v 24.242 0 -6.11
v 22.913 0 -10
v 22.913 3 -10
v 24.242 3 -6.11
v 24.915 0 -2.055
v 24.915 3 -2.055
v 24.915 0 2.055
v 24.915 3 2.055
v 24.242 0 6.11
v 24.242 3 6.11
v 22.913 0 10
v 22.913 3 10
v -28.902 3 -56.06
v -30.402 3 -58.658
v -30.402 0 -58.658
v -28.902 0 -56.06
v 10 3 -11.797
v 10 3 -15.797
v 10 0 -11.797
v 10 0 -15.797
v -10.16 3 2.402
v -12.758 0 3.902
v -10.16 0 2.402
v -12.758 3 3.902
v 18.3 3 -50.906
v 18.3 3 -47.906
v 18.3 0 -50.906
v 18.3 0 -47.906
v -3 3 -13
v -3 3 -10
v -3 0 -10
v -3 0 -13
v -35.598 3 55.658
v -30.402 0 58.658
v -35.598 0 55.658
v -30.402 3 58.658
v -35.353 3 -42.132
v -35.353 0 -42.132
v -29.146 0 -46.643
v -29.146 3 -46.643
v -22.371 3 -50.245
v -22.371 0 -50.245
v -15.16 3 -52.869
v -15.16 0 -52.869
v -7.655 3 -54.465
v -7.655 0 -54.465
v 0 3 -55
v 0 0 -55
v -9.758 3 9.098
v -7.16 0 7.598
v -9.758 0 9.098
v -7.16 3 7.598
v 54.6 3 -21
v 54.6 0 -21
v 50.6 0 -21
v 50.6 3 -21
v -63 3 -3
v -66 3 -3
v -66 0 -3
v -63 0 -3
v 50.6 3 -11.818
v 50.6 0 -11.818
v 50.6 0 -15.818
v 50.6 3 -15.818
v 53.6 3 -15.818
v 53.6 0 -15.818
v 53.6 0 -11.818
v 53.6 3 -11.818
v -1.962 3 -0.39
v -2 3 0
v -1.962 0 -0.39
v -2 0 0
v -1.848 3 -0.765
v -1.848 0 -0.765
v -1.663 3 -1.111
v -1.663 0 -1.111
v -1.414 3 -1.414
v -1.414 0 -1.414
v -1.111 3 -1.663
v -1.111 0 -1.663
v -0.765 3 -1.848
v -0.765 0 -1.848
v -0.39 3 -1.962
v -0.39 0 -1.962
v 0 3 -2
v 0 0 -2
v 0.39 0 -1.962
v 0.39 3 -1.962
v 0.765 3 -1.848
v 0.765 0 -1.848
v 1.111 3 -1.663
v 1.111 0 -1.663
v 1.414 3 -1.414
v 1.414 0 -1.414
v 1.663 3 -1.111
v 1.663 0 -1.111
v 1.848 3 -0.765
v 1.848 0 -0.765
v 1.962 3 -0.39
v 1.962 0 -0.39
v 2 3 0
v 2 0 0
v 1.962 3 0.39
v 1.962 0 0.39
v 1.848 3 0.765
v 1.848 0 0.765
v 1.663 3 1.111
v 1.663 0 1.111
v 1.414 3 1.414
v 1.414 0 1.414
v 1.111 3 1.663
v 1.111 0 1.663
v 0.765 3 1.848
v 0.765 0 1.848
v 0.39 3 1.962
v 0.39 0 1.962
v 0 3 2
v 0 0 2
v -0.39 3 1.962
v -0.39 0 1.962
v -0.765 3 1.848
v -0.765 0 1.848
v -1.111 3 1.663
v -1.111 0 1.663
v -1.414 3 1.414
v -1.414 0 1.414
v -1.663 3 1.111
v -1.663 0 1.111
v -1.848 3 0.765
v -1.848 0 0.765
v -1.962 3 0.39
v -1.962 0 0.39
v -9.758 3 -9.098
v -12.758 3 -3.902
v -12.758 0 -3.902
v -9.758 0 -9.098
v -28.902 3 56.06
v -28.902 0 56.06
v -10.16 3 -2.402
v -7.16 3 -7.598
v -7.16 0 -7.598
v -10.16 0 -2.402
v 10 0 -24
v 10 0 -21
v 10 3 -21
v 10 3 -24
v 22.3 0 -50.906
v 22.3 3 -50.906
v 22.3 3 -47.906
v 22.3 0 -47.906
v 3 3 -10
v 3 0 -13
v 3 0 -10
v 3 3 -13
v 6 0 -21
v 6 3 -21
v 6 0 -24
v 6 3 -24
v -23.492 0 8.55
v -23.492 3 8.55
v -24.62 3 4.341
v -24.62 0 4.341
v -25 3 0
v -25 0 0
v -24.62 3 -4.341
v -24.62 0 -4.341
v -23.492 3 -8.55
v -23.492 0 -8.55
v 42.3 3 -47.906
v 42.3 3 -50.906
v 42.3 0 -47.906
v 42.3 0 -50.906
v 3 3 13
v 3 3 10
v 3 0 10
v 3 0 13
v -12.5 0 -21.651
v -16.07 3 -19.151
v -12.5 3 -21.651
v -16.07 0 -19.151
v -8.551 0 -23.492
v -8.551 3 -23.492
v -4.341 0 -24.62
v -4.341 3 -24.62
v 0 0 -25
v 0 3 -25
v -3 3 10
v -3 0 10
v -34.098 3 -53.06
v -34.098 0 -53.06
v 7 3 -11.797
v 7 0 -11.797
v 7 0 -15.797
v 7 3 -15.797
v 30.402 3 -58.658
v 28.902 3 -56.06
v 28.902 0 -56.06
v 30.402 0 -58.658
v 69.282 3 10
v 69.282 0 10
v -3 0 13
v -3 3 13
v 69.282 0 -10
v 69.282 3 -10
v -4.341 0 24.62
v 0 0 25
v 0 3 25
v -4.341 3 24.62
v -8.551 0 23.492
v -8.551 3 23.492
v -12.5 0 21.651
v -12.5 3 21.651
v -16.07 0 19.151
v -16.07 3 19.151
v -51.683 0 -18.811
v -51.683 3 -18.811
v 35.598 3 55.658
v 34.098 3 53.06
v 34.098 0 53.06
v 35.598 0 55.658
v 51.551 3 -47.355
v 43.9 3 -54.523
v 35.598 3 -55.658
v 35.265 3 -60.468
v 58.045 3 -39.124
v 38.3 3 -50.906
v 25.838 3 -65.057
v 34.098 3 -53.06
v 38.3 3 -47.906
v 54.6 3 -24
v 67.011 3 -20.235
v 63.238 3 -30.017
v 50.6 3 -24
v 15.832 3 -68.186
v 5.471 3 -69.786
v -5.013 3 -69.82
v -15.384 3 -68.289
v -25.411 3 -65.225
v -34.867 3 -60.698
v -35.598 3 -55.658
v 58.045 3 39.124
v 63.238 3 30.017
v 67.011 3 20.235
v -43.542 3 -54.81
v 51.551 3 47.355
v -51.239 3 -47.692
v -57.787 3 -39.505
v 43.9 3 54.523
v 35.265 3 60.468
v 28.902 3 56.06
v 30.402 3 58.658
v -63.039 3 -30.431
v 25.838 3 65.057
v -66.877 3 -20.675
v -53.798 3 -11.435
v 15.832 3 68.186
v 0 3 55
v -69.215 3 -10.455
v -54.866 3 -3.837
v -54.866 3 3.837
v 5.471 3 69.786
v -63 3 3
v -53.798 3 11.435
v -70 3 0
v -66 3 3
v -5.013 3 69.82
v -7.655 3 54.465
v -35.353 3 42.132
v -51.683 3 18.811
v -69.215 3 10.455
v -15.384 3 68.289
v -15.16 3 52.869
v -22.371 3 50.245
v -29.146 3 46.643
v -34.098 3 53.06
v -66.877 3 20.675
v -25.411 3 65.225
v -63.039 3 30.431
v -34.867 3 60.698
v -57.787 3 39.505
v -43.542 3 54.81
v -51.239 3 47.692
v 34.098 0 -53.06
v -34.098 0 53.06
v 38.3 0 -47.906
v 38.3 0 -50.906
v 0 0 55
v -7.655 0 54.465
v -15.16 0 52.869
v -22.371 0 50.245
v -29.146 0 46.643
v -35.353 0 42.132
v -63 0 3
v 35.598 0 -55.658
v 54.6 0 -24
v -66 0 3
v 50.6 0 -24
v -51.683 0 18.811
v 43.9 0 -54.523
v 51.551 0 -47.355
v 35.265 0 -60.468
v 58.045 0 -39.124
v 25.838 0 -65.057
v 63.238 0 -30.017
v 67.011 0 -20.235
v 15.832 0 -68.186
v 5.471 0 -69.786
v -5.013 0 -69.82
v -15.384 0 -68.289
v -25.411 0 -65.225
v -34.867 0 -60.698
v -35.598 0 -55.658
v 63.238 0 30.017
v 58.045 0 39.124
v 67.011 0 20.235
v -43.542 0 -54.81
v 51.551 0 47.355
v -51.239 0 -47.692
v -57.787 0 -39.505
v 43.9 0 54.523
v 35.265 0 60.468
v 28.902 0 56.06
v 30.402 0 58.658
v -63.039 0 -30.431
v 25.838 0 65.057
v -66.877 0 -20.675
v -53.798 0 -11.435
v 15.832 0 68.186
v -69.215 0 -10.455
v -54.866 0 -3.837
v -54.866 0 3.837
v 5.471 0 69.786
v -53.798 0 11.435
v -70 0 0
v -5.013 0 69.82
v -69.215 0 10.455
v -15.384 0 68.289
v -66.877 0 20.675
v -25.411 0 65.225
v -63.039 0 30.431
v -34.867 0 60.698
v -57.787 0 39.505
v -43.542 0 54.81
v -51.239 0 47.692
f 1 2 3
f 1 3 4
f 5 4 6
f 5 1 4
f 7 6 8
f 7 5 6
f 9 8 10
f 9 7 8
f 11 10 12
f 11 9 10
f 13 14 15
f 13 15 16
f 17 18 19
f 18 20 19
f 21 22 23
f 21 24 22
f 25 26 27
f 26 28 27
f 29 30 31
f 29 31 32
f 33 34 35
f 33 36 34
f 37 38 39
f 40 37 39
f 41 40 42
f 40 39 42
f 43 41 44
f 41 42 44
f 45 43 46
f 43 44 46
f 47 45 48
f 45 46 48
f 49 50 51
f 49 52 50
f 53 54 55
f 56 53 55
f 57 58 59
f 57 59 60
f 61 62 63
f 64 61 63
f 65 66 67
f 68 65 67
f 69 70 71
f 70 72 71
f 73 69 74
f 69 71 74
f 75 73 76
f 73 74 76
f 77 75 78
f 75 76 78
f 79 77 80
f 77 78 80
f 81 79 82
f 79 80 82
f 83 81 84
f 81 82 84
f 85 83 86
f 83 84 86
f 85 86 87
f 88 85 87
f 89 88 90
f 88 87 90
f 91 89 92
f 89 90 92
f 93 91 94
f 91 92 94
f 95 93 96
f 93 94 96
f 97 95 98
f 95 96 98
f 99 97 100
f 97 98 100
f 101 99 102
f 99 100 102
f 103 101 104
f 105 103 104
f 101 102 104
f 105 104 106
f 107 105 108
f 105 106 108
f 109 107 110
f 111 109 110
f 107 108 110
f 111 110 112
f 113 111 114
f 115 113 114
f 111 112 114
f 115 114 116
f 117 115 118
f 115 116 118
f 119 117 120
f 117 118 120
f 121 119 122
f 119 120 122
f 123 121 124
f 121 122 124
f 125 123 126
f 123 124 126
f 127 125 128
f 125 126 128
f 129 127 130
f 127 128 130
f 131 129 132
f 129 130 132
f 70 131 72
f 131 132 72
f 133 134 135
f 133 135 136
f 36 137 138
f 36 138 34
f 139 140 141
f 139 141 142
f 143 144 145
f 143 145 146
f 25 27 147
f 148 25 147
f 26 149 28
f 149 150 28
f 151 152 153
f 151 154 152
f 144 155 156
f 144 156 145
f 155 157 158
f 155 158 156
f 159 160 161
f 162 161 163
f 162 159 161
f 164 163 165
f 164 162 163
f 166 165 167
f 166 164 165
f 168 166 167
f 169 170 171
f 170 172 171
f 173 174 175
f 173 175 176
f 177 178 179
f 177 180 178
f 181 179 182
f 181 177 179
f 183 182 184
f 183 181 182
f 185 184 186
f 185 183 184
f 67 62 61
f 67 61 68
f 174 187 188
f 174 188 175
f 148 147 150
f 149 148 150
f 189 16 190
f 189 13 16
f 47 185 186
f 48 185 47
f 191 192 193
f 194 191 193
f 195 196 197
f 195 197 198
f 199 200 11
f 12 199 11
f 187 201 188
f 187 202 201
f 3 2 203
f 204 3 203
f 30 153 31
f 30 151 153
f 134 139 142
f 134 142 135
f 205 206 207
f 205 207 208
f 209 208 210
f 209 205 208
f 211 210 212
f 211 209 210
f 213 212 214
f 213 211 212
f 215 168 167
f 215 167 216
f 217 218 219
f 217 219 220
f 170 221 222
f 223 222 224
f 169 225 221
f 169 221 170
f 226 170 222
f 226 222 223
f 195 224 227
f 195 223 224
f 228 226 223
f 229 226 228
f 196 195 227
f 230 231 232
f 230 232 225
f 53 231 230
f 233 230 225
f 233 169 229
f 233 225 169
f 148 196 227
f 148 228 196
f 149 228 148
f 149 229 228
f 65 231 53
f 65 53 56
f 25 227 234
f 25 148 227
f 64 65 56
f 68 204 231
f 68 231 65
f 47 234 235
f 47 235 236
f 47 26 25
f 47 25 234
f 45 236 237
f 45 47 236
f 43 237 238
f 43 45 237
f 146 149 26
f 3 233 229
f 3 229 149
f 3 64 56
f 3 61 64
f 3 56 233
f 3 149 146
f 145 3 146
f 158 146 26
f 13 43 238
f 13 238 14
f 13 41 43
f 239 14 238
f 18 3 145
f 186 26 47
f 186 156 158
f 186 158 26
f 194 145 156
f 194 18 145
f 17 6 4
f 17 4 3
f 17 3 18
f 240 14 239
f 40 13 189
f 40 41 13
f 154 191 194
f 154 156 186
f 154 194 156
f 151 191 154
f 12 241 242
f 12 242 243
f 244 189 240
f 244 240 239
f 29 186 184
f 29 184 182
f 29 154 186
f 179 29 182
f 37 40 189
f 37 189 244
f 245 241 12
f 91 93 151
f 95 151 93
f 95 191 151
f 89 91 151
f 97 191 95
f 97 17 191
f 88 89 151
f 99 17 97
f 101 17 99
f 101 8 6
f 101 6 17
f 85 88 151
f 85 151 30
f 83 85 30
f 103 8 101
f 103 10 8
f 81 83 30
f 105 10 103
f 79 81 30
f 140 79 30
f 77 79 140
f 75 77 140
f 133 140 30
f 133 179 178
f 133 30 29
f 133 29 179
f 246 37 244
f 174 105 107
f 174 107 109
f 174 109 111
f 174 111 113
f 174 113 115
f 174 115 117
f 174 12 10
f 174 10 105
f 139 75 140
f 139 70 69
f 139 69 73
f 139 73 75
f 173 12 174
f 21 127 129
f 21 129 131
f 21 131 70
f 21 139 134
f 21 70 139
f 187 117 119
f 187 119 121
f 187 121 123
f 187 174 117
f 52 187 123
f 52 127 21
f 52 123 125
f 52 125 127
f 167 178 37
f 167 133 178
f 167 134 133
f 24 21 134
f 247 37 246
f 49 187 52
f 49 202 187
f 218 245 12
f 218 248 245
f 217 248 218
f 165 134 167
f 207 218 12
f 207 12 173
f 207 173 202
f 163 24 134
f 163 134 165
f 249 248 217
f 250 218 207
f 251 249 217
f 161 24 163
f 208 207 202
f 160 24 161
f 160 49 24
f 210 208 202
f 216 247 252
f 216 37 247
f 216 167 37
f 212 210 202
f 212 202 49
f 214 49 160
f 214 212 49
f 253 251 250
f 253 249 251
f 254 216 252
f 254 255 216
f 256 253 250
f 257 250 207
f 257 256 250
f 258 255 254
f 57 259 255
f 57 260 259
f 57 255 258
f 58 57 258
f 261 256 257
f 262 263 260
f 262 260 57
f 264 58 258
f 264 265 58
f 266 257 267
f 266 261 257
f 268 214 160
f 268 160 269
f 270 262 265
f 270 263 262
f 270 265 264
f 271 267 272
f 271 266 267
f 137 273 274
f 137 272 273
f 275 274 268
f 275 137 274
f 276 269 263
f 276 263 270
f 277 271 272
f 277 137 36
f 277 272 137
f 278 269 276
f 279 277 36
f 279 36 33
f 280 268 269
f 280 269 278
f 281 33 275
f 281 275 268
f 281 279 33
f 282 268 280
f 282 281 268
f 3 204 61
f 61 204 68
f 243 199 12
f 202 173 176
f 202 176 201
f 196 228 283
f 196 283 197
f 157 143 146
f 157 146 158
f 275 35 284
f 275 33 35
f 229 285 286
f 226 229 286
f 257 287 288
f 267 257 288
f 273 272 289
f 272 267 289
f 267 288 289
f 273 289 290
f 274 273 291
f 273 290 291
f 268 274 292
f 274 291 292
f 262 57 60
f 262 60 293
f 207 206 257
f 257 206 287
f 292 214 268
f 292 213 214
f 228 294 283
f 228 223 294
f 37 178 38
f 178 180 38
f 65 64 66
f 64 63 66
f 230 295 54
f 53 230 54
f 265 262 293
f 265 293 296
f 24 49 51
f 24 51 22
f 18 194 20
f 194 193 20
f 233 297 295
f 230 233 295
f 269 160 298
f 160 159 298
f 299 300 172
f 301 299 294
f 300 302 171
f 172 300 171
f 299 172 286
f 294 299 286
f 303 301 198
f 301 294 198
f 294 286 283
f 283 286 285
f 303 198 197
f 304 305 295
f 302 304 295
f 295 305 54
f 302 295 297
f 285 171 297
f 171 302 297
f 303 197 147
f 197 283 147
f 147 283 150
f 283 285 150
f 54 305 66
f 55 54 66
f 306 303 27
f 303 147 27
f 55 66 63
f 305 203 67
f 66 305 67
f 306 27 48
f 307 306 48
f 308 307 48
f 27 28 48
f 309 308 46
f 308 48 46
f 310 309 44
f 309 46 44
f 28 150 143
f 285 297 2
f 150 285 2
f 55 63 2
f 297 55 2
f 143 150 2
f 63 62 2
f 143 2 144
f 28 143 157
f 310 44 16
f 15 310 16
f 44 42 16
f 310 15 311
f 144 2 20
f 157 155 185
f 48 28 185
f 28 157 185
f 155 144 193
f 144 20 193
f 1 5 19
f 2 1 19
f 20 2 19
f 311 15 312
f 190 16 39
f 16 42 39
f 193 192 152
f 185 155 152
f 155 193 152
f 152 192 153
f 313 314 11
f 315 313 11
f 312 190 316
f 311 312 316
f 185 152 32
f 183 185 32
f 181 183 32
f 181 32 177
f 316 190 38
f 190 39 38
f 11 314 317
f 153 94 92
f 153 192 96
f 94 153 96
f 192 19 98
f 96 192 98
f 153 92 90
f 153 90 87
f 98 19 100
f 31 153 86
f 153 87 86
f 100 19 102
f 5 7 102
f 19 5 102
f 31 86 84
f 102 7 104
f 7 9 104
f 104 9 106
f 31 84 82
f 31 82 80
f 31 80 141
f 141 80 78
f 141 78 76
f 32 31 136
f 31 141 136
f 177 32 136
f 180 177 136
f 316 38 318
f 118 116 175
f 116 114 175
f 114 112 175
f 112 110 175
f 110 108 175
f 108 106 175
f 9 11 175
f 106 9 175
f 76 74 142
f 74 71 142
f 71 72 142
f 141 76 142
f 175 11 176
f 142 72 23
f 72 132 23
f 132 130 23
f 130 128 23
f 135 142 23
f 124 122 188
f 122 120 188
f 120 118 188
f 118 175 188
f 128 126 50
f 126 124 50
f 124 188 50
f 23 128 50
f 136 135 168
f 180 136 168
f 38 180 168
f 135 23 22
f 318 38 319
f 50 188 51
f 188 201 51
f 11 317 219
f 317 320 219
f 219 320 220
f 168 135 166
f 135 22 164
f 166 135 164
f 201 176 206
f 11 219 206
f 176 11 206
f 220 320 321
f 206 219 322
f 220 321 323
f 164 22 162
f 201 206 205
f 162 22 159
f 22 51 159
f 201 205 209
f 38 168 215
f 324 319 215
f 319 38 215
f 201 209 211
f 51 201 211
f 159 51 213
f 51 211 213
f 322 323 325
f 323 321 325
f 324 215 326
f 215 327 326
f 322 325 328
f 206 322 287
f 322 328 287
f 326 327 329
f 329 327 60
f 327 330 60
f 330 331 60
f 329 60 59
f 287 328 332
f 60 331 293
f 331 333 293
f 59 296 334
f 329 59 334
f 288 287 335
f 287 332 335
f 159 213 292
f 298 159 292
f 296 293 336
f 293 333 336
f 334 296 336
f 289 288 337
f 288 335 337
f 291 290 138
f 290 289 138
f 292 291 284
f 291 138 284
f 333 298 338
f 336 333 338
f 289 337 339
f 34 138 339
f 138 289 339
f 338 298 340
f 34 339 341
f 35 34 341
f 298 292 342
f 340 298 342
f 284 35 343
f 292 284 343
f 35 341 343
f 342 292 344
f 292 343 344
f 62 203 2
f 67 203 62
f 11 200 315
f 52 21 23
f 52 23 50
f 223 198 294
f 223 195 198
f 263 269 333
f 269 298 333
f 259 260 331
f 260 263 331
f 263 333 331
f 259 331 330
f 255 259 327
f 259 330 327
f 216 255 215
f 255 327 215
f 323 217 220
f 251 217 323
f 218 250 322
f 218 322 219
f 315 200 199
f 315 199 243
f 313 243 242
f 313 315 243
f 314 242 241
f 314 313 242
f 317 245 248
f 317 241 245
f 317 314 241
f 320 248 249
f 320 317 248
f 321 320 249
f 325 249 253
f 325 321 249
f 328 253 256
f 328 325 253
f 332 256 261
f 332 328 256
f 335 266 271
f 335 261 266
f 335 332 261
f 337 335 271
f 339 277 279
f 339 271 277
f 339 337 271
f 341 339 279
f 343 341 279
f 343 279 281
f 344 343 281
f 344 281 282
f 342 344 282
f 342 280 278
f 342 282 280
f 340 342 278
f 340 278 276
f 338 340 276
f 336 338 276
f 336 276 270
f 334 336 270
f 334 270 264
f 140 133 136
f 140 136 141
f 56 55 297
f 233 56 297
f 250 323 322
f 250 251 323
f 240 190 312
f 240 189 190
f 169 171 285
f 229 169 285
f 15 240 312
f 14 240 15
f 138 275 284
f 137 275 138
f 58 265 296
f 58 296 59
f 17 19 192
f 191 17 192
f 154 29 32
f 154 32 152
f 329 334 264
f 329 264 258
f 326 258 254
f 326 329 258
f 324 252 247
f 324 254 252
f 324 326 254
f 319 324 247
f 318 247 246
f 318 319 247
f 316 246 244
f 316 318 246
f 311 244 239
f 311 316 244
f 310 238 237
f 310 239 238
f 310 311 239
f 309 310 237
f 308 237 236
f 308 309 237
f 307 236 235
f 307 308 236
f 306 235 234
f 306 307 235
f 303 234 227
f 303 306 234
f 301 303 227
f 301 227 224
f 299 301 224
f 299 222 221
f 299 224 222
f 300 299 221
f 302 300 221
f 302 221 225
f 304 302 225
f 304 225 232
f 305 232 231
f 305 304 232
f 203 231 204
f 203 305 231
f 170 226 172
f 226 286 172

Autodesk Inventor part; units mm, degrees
ref_plane "YZ Plane" through (0, 0, 0) normal (1, 0, 0) x (0, 1, 0)
ref_plane "XZ Plane" through (0, 0, 0) normal (0, 1, 0) x (-1, 0, 0)
ref_plane "XY Plane" through (0, 0, 0) normal (0, 0, 1) x (1, 0, 0)
sketch "草圖1" plane through (0, 0, 0) normal (0, 1, 0) x (-1, 0, 0)
  circle A0 centre (0, 0) radius 70
  circle A1 centre (0, 0) radius 25
  line L0 (-70, 10) -> (-10, 10)
  line L1 (-10, 10) -> (-10, -10)
  line L2 (-10, -10) -> (-70, -10)
  line L3 (-70, -10) -> (-70, 10)
  line L4 (0, 0) -> (0, -55)
  line L5 (0, 0) -> (35.3533, -42.1324)
  arc A2 (0, -55) -> (35.3533, -42.1324) centre (0, 0) ccw
  line L6 (0, 0) -> (51.6831, -18.8111)
  line L7 (0, 0) -> (51.6831, 18.8111)
  arc A3 (51.6831, -18.8111) -> (51.6831, 18.8111) centre (0, 0) ccw
  line L8 (0, 0) -> (35.3533, 42.1324)
  line L9 (0, 0) -> (0, 55)
  arc A4 (35.3533, 42.1324) -> (0, 55) centre (0, 0) ccw
  circle A5 centre (0, 0) radius 2
  line L10 (-1.5, 1.3229) -> (-1.5, -1.3229)
  line L11 (-53.6, -11.7755) -> (-50.6, -11.7755)
  line L12 (-10, -11.7968) -> (-7, -11.7968)
  line L13 (-50.6, -11.8181) -> (-50.6, -15.8181)
  line L14 (-50.6, -15.8181) -> (-53.6, -15.8181)
  line L15 (-53.6, -15.8181) -> (-53.6, -11.8181)
  line L16 (-7, -11.7968) -> (-7, -15.7968)
  line L17 (-7, -15.7968) -> (-10, -15.7968)
  line L18 (-10, -15.7968) -> (-10, -11.7968)
  line L19 (-42.3, -47.9058) -> (-38.3, -47.9058)
  line L20 (-38.3, -47.9058) -> (-38.3, -50.9058)
  line L21 (-38.3, -50.9058) -> (-42.3, -50.9058)
  line L22 (-42.3, -50.9058) -> (-42.3, -47.9058)
  line L23 (-22.3, -47.9058) -> (-18.3, -47.9058)
  line L24 (-18.3, -47.9058) -> (-18.3, -50.9058)
  line L25 (-18.3, -50.9058) -> (-22.3, -50.9058)
  line L26 (-22.3, -50.9058) -> (-22.3, -47.9058)
  line L27 (-10, -10) -> (-10, -11.349)
  line L28 (-50.6, -11.8181) -> (-53.6, -11.8181)
  line L29 (-53.6, -11.8181) -> (-53.6, -15.8181)
  line L30 (-50.6, -15.8181) -> (-50.6, -11.8181)
  line L31 (-4, -24) -> (-4, -21) construction
  line L32 (-10, -21) -> (-6, -21) construction
  line L33 (-6, -21) -> (-4, -21) construction
  line L34 (-6, -24) -> (-4, -24) construction
  line L35 (-10, -24) -> (-6, -24) construction
  line L36 (-12, -24) -> (-12, -21) construction
  line L37 (-6, -21) -> (-10, -21)
  line L38 (-10, -21) -> (-10, -24)
  line L39 (-10, -24) -> (-6, -24)
  line L40 (-6, -24) -> (-6, -21)
  line L41 (-50.6, -24) -> (-54.6, -24)
  line L42 (-54.6, -24) -> (-54.6, -21)
  line L43 (-54.6, -21) -> (-50.6, -21)
  line L44 (-50.6, -21) -> (-50.6, -24)
  line L45 (-10, -16.4) -> (-10, -21)
  point P0 (-23, -10)
  point P1 (16.0697, -19.1511)
  point P2 (0, -25)
  point P3 (-69.282, 10)
  point P4 (-69.282, -10)
  point P5 (16.0697, 19.1511)
  point P6 (0, 25)
  point P7 (23.4923, -8.5505)
  point P8 (23.4923, 8.5505)
  point P9 (-70, 0)
  point P10 (-10, 0)
  point P11 (-23, -7)
  point P12 (-52.6, -24)
  point P13 (-8, -24)
  point P14 (-22.9129, 10)
  point P15 (-22.9129, -10)
  dimension "d0" = 140
  dimension "d1" = 50
  dimension "d2" = 20
  dimension "d3" = 60
  dimension "d5" = 40
  dimension "d6" = 55
  dimension "d9" = 140
  dimension "d28" = 4
  dimension "d29" = 1.5
  dimension "d32" = 13
  dimension "d57" = 1.349
  dimension "d58" = 40.6
  dimension "d59" = 4.6
extrude "擠出1" add sketch "草圖1" along normal blind 3 contours A0 L2 A1 L38 L39 L4 A2 L5 L6 A3 L7 L8 A4 L9 L0 | L0 L1 L2 A1 | A1 L9 A5 L4 L39 L40 L37 L38 L2 L1 L0 | A1 L8 A5 L9 | A1 L7 A5 L8 | A1 L6 A5 L7 | L4 A5 L5 A1 | A5 L6 A1 L5
sketch "草圖2" plane through (0, 3, 0) normal (0, 1, 0) x (1, 0, 0)
  line L0 (-3, 13) -> (3, 13)
  line L1 (3, 13) -> (3, 10)
  line L2 (3, 10) -> (-3, 10)
  line L3 (-3, 10) -> (-3, 13)
  line L4 (-12.7583, 3.9019) -> (-9.7583, 9.0981)
  line L5 (-9.7583, 9.0981) -> (-7.1603, 7.5981)
  line L6 (-7.1603, 7.5981) -> (-10.1603, 2.4019)
  line L7 (-10.1603, 2.4019) -> (-12.7583, 3.9019)
  line L8 (-9.7583, -9.0981) -> (-12.7583, -3.9019)
  line L9 (-12.7583, -3.9019) -> (-10.1603, -2.4019)
  line L10 (-10.1603, -2.4019) -> (-7.1603, -7.5981)
  line L11 (-7.1603, -7.5981) -> (-9.7583, -9.0981)
  line L12 (3, -13) -> (-3, -13)
  line L13 (-3, -13) -> (-3, -10)
  line L14 (-3, -10) -> (3, -10)
  line L15 (3, -10) -> (3, -13)
  line L16 (-66, 3) -> (-63, 3)
  line L17 (-63, 3) -> (-63, -3)
  line L18 (-63, -3) -> (-66, -3)
  line L19 (-66, -3) -> (-66, 3)
  line L20 (-34.0981, -53.0596) -> (-28.9019, -56.0596)
  line L21 (-28.9019, -56.0596) -> (-30.4019, -58.6577)
  line L22 (-30.4019, -58.6577) -> (-35.5981, -55.6577)
  line L23 (-35.5981, -55.6577) -> (-34.0981, -53.0596)
  line L24 (28.9019, -56.0596) -> (34.0981, -53.0596)
  line L25 (34.0981, -53.0596) -> (35.5981, -55.6577)
  line L26 (35.5981, -55.6577) -> (30.4019, -58.6577)
  line L27 (30.4019, -58.6577) -> (28.9019, -56.0596)
  line L28 (63, -3) -> (63, 3)
  line L29 (63, 3) -> (66, 3)
  line L30 (66, 3) -> (66, -3)
  line L31 (66, -3) -> (63, -3)
  line L32 (34.0981, 53.0596) -> (28.9019, 56.0596)
  line L33 (28.9019, 56.0596) -> (30.4019, 58.6577)
  line L34 (30.4019, 58.6577) -> (35.5981, 55.6577)
  line L35 (35.5981, 55.6577) -> (34.0981, 53.0596)
  line L36 (-28.9019, 56.0596) -> (-34.0981, 53.0596)
  line L37 (-34.0981, 53.0596) -> (-35.5981, 55.6577)
  line L38 (-35.5981, 55.6577) -> (-30.4019, 58.6577)
  line L39 (-30.4019, 58.6577) -> (-28.9019, 56.0596)
  point P0 (0, 0)
  point P1 (0, 10)
  point P2 (-8.6603, 5)
  point P3 (-8.6603, -5)
  point P4 (0, -10)
  point P5 (-63, 0)
  point P6 (-31.5, -54.5596)
  point P7 (31.5, -54.5596)
  point P8 (63, 0)
  point P9 (31.5, 54.5596)
  point P10 (-31.5, 54.5596)
  dimension "d33" = 3
  dimension "d34" = 6
  dimension "d35" = 10
  dimension "d38" = 180
  dimension "d49" = 3
  dimension "d50" = 6
  dimension "d51" = 63
  dimension "d54" = 360
extrude "擠出2" cut sketch "草圖2" against normal through all contours L0 L1 L2 L3 | L4 L5 L6 L7 | L8 L9 L10 L11 | L12 L13 L14 L15 | L16 L17 L18 L19 | L20 L21 L22 L23 | L24 L25 L26 L27 | L32 L33 L34 L35 | L36 L37 L38 L39
